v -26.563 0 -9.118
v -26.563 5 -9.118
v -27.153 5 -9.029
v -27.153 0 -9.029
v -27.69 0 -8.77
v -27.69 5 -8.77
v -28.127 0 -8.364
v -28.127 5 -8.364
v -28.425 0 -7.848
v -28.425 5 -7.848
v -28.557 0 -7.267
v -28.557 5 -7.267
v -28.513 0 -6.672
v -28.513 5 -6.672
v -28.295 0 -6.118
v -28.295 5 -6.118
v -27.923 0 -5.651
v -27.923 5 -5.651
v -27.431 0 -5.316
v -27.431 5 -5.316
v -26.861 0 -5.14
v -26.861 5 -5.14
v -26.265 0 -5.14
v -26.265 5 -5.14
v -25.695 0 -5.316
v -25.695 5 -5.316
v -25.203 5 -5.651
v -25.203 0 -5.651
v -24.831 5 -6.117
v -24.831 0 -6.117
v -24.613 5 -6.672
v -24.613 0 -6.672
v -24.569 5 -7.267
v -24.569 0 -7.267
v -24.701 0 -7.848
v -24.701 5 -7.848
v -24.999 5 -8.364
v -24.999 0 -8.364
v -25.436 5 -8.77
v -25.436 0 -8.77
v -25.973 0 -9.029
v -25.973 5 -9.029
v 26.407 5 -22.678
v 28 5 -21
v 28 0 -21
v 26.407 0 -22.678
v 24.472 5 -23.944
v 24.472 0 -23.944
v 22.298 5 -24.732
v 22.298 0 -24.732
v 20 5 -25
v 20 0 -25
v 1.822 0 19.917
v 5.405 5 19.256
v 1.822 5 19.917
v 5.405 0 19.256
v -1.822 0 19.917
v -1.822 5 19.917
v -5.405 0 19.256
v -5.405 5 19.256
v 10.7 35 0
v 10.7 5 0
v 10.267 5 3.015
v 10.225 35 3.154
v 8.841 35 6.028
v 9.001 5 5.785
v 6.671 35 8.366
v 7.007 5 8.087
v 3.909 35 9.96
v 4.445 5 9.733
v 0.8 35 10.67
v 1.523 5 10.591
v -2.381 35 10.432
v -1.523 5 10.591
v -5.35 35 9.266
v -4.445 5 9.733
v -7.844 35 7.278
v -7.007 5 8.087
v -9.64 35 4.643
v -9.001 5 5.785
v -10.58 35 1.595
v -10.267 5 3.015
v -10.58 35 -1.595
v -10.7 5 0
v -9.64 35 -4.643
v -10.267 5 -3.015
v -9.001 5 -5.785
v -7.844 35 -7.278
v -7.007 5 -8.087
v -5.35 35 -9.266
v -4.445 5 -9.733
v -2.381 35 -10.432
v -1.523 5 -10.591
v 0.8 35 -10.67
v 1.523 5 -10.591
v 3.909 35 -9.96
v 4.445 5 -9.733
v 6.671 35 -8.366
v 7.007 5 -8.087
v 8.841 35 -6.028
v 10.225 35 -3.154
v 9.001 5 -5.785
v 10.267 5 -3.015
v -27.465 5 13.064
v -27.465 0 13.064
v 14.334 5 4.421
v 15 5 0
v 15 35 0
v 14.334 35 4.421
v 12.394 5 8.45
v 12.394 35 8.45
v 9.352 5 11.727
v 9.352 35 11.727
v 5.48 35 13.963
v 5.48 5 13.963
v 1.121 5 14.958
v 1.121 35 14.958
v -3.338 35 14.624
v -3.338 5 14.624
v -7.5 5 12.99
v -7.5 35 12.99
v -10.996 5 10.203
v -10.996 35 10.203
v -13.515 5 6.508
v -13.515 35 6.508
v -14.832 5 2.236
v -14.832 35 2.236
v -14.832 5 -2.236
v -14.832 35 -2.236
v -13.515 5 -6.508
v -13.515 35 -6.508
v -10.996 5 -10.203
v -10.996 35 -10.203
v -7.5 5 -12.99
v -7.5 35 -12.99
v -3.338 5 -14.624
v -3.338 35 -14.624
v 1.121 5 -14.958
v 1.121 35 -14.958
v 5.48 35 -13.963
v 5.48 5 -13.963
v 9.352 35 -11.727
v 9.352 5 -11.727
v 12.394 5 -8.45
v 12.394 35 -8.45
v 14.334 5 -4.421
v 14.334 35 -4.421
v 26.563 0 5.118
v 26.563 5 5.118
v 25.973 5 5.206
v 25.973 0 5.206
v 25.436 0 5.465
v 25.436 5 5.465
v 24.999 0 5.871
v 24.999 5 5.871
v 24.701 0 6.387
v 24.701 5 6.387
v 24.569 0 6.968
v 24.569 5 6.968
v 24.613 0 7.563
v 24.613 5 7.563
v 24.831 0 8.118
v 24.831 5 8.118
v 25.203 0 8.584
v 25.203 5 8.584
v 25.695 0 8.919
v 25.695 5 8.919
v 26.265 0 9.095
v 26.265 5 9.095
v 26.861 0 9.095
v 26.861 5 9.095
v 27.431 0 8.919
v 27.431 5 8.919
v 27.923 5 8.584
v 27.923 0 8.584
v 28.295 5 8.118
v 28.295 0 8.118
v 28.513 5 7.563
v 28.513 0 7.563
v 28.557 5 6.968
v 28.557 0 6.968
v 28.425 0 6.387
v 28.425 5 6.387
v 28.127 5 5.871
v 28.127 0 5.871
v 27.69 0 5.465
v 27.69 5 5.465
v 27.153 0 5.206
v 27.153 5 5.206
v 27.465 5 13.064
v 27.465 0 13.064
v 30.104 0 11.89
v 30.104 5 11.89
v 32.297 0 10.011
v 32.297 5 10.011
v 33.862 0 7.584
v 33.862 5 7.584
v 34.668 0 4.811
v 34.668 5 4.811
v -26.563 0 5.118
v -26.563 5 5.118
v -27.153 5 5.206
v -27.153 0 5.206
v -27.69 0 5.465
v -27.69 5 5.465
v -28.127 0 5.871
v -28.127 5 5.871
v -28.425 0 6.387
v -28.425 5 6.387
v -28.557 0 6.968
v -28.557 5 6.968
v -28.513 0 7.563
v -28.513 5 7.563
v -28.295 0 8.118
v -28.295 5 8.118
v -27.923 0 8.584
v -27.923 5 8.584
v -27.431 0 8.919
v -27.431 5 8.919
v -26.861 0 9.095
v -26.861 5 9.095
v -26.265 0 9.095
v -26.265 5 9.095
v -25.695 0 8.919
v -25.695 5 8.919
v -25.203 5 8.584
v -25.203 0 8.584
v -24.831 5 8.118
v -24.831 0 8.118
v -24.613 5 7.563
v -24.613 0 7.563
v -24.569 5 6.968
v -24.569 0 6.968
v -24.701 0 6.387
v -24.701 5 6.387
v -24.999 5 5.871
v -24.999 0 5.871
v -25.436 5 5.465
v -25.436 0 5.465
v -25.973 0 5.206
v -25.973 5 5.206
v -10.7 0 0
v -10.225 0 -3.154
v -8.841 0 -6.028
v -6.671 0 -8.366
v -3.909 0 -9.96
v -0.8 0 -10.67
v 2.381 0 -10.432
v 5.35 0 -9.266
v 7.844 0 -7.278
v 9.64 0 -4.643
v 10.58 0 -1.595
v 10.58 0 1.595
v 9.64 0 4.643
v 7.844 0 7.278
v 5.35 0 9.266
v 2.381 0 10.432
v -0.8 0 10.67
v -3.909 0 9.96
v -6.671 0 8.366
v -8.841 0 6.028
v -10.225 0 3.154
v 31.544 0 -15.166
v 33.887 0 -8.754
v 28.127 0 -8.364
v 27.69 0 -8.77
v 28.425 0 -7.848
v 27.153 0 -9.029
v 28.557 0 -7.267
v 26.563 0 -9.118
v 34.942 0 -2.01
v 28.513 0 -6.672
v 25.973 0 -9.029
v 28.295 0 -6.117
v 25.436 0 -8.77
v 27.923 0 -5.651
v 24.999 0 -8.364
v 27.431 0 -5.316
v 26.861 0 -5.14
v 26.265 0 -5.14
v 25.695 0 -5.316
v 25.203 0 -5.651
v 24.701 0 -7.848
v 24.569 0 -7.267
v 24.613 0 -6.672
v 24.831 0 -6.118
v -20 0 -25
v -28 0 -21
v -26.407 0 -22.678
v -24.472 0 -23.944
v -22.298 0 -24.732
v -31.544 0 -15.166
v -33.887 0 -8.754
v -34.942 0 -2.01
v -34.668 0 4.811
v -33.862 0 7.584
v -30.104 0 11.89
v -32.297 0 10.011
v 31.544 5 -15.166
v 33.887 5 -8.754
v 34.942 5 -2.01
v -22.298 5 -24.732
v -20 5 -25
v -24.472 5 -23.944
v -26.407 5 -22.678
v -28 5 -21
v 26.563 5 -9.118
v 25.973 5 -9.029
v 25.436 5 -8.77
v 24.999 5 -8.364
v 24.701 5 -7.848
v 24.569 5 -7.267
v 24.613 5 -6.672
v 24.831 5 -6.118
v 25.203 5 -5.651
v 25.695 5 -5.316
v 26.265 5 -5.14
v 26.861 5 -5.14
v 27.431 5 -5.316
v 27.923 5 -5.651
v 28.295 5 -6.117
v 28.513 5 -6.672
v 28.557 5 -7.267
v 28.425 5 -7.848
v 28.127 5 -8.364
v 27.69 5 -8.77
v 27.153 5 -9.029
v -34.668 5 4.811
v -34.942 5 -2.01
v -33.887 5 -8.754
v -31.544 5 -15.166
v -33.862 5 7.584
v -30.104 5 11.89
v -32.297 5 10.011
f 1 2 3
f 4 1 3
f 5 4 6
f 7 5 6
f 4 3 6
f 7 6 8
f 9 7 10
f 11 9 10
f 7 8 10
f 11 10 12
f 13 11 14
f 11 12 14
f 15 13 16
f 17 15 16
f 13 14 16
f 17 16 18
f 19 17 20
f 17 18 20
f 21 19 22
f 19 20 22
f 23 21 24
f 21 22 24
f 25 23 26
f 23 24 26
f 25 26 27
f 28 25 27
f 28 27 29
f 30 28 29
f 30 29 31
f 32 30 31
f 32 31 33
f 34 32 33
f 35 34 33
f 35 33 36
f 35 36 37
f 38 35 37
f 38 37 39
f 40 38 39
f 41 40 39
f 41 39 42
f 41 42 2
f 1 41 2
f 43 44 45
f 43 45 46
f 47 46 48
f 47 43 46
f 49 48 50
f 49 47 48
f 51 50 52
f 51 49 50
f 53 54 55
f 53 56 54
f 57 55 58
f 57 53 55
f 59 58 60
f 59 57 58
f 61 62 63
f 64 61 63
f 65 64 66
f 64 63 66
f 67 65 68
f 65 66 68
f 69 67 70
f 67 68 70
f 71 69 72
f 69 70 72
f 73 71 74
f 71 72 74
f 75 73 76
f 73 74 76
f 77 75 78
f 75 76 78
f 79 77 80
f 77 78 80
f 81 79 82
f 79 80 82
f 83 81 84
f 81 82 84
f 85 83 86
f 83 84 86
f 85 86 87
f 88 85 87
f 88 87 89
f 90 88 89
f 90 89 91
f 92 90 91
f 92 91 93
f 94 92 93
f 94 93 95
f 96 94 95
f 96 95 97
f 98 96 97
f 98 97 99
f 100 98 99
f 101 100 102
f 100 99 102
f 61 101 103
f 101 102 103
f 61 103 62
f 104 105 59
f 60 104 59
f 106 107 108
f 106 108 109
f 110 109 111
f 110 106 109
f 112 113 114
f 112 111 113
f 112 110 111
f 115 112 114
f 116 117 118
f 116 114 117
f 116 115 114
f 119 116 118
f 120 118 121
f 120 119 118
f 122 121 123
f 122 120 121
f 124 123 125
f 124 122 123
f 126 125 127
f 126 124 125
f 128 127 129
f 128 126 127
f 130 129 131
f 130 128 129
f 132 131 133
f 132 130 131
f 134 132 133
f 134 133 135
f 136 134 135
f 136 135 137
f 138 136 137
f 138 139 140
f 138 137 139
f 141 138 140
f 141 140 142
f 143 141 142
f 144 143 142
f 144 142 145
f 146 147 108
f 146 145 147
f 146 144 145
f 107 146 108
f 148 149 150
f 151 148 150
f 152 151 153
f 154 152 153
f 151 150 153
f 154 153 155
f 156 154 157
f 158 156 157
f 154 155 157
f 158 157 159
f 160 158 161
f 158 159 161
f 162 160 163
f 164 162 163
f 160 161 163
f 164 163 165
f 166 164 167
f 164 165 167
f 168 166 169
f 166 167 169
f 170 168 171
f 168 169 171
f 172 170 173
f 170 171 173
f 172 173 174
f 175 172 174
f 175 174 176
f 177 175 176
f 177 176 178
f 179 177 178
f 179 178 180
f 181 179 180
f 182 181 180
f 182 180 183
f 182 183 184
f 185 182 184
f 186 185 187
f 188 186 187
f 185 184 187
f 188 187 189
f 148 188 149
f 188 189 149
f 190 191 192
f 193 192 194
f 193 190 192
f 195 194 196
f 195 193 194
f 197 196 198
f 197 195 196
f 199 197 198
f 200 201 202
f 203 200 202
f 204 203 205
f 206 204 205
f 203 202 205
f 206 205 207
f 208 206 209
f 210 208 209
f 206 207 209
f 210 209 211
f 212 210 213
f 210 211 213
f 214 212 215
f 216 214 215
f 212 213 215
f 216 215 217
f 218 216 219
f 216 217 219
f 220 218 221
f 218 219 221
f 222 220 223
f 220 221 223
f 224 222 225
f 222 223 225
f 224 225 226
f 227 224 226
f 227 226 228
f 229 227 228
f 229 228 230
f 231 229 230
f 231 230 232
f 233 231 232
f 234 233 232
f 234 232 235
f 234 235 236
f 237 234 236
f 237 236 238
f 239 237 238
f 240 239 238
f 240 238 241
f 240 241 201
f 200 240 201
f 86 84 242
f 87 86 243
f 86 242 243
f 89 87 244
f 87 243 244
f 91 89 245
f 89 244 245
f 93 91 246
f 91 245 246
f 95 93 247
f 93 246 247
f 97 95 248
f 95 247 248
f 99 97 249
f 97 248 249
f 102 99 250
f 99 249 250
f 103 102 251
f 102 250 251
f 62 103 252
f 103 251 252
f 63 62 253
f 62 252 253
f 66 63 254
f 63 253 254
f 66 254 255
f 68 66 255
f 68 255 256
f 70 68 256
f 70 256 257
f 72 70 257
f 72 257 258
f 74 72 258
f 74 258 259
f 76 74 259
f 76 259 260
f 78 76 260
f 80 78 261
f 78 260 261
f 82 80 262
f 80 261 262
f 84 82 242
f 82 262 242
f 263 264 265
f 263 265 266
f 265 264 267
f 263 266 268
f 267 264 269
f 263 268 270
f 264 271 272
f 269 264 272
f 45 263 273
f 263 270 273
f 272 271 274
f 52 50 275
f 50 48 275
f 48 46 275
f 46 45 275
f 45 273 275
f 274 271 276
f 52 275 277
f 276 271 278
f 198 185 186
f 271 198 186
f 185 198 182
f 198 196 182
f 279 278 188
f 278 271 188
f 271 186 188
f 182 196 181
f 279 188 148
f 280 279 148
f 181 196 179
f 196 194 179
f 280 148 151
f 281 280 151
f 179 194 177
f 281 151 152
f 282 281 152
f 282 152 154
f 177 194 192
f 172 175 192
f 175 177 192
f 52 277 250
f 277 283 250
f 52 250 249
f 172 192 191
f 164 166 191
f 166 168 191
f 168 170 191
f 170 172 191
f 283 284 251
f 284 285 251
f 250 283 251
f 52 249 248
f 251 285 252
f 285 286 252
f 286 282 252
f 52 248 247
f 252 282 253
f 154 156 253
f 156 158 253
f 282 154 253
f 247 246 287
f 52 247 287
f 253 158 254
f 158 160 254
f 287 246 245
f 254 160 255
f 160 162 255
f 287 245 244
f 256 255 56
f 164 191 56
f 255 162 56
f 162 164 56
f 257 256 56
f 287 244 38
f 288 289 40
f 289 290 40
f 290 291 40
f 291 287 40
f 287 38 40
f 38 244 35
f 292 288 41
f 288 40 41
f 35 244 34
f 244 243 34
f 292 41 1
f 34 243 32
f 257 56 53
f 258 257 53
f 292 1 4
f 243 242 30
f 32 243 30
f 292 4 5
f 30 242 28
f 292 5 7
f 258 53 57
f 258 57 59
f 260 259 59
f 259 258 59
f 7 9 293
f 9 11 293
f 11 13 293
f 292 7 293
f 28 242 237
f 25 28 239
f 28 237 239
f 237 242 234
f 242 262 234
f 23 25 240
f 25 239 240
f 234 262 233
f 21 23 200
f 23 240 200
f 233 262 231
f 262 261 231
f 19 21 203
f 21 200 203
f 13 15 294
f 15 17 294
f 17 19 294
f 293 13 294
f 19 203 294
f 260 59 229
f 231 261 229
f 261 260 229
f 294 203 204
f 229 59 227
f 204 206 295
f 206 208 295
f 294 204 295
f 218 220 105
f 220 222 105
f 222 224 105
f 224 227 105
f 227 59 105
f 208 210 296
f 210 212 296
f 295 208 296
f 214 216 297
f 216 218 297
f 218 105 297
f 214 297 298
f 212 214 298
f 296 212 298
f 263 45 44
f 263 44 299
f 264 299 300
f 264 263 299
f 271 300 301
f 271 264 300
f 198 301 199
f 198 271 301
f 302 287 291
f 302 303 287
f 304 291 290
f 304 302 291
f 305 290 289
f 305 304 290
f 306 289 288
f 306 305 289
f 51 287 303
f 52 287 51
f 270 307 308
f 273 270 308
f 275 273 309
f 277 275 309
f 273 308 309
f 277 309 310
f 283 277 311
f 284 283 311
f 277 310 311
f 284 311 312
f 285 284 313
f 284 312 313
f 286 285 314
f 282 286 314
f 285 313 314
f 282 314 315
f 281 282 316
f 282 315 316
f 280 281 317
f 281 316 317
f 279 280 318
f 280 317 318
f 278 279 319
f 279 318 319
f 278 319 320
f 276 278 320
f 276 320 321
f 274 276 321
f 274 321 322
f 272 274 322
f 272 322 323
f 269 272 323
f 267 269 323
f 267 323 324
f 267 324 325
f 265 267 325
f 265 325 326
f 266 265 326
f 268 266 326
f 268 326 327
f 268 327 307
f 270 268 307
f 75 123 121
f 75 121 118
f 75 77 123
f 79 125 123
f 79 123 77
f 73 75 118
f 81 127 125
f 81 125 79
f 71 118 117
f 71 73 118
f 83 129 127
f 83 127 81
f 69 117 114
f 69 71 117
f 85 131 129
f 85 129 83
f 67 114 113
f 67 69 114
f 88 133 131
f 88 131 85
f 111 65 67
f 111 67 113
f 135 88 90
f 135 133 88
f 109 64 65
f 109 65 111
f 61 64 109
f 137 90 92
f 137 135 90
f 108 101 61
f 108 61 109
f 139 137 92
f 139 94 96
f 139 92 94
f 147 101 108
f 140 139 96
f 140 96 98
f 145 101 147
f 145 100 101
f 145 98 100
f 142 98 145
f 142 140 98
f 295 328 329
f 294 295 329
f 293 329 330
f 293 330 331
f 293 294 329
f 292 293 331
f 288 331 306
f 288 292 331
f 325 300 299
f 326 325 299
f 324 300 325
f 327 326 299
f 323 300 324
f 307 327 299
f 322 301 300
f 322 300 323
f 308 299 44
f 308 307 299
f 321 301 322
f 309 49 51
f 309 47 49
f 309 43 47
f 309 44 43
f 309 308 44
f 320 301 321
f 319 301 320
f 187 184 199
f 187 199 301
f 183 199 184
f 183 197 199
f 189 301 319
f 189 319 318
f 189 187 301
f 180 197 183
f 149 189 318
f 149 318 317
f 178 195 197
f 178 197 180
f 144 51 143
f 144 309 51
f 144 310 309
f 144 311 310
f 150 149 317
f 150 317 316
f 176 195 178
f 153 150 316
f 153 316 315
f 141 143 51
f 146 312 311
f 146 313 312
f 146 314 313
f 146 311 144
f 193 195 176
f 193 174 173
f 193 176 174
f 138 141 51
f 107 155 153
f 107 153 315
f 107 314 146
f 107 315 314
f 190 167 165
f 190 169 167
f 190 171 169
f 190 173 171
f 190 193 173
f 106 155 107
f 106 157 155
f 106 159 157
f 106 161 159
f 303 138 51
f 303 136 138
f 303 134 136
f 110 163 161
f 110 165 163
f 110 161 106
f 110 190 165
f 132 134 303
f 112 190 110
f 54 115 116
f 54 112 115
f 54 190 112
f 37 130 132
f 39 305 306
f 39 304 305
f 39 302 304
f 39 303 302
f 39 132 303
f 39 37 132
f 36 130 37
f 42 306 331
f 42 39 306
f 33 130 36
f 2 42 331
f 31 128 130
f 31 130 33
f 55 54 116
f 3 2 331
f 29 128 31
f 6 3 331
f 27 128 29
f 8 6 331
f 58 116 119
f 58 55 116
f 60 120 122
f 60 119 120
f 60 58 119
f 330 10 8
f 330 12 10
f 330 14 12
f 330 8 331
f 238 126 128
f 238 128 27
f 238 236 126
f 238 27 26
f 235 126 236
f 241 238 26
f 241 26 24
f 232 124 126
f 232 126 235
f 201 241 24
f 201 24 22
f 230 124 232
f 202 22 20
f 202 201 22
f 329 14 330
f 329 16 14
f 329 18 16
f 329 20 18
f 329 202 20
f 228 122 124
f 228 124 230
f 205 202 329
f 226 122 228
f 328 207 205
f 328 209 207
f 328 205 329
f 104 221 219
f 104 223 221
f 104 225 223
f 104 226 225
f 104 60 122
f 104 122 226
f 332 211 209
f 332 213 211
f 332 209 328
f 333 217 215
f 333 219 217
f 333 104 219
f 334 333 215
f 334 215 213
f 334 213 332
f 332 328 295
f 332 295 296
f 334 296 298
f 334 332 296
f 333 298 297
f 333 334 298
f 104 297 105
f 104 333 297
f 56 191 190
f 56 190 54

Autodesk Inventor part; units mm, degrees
ref_plane "YZ Plane" through (0, 0, 0) normal (1, 0, 0) x (0, 1, 0)
ref_plane "XZ Plane" through (0, 0, 0) normal (0, 1, 0) x (-1, 0, 0)
ref_plane "XY Plane" through (0, 0, 0) normal (0, 0, 1) x (1, 0, 0)
sketch "Sketch1" plane through (0, 0, 0) normal (0, 1, 0) x (-1, 0, 0)
  circle A0 centre (0, 0) radius 35
  circle A1 centre (0, 0) radius 10.7
  line L0 (0, 0) -> (0, -48)
  line L1 (60, -48) -> (-60, -48)
  circle A2 centre (-60, -48) radius 50
  circle A3 centre (60, -48) radius 50
  circle A4 centre (0, 0) radius 20
  line L2 (73.5118, 0.1397) -> (5.4047, 19.2559)
  line L3 (-73.5118, 0.1397) -> (-5.4047, 19.2559)
  line L4 (0, 0) -> (0, -25)
  line L5 (24.4949, -25) -> (-24.4949, -25)
  circle A5 centre (0, 0) radius 27.5
  line L6 (0, 0) -> (-26.563, 7.1175)
  line L7 (0, 0) -> (27.5, 0) construction
  line L8 (0, 0) -> (-26.563, -7.1175)
  line L9 (0, 0) -> (26.563, 7.1175)
  line L10 (0, 0) -> (26.563, -7.1175)
  point P0 (33.0589, 11.494)
  point P1 (-33.0589, 11.494)
  dimension "d0" = 70
  dimension "d10" = 100
  dimension "d11" = 100
  dimension "d1" = 21.4
  dimension "d8" = 48
  dimension "d9" = 120
  dimension "d12" = 40
  dimension "d13" = 25
  dimension "d18" = 55
  dimension "d19" = 165
extrude "Extrusion1" add sketch "Sketch1" along normal blind 5 contours A0 A3 A5 L2 | A0 L5 A3 A5 | L3 A5 A2 A0 | A5 L9 A4 L2 | A5 A3 | A3 A5 L5 L0 A4 L10 | A2 A5 L5 A0 | L3 A4 L6 A5 | A4 L9 A1 L6 | A5 L10 A4 L9 | L5 A5 A3 | A5 L8 A4 L0 L5 A2 | A2 A5 | L6 A4 L8 A5 | A4 L10 A1 L9 | A4 L0 A1 L10 | A2 A5 L5 | L6 A1 L8 A4 | A4 L8 A1 L0
fillet "Fillet1" radius 10 4 edges at (33.0589, 2.5, 11.494) (-33.0589, 2.5, 11.494) (24.4949, 2.5, -25) (-24.4949, 2.5, -25)
sketch "Sketch3" plane through (0, 5, 0) normal (0, 1, 0) x (1, 0, 0)
  circle A0 centre (0, 0) radius 10.7
  circle A1 centre (0, 0) radius 15
  dimension "d15" = 30
extrude "Extrusion3" add sketch "Sketch3" along normal blind 30
hole "Hole1" at (26.563, 0, 7.1175) at (26.563, 0, -7.1175) at (-26.563, 0, 7.1175) at (-26.563, 0, -7.1175) direction (0, 1, 0) diameter 4 end through all
properties part number "SyringeHolder"
